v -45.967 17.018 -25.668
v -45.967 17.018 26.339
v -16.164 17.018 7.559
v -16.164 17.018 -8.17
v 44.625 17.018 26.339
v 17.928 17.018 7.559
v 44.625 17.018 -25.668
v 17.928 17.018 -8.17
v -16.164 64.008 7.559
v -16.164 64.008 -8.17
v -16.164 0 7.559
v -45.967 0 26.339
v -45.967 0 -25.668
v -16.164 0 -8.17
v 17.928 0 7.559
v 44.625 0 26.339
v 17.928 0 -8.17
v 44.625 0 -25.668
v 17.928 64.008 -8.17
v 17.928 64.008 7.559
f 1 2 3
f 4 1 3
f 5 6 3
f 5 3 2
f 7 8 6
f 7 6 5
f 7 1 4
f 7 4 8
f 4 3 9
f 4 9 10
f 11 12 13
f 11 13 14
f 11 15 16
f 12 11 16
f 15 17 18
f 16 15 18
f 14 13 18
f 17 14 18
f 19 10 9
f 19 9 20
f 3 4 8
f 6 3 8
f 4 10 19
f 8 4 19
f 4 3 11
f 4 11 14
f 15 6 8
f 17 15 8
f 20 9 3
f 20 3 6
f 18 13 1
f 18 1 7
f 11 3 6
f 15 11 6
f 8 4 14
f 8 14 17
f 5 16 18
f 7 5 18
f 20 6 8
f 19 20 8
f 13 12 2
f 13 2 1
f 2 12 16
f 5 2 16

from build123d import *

# Parameters (mm, degrees)
SKETCH2_W           = 90.591455621
SKETCH2_H           = 52.006206005
BOSS_EXTRUDE1_DEPTH = 17.018
SKETCH4_W           = 34.091551214
SKETCH4_H           = 15.728929147
CUT_EXTRUDE2_DEPTH  = 46.99
SKETCH4_2_W         = 34.091551214
SKETCH4_2_H         = 15.728929147
BOSS_EXTRUDE2_DEPTH = 46.99


with BuildPart() as part:
    # Sketch2 → Boss-Extrude1 (new body)
    with BuildSketch(Plane(origin=(0, 0, 0), x_dir=(1, 0, 0), z_dir=(0, 1, 0))):
        with Locations((-0.67104782, -0.33552391)):
            Rectangle(SKETCH2_W, SKETCH2_H)
    extrude(amount=BOSS_EXTRUDE1_DEPTH)

    # Sketch4 → Cut-Extrude2 (cut)
    with BuildSketch(Plane(origin=(0, 17.018, 0), x_dir=(1, 0, 0), z_dir=(0, 1, 0))):
        with Locations((0.882057956, 0.305536675)):
            Rectangle(SKETCH4_W, SKETCH4_H)
    extrude(amount=-CUT_EXTRUDE2_DEPTH, mode=Mode.SUBTRACT)


with BuildPart() as body_2:
    # Sketch4<2> → Boss-Extrude2 (new body)
    with BuildSketch(Plane(origin=(0, 17.018, 0), x_dir=(1, 0, 0), z_dir=(0, 1, 0))):
        with Locations((0.882057956, 0.305536675)):
            Rectangle(SKETCH4_2_W, SKETCH4_2_H)
    extrude(amount=BOSS_EXTRUDE2_DEPTH)


solid = Compound([part.part, body_2.part])
